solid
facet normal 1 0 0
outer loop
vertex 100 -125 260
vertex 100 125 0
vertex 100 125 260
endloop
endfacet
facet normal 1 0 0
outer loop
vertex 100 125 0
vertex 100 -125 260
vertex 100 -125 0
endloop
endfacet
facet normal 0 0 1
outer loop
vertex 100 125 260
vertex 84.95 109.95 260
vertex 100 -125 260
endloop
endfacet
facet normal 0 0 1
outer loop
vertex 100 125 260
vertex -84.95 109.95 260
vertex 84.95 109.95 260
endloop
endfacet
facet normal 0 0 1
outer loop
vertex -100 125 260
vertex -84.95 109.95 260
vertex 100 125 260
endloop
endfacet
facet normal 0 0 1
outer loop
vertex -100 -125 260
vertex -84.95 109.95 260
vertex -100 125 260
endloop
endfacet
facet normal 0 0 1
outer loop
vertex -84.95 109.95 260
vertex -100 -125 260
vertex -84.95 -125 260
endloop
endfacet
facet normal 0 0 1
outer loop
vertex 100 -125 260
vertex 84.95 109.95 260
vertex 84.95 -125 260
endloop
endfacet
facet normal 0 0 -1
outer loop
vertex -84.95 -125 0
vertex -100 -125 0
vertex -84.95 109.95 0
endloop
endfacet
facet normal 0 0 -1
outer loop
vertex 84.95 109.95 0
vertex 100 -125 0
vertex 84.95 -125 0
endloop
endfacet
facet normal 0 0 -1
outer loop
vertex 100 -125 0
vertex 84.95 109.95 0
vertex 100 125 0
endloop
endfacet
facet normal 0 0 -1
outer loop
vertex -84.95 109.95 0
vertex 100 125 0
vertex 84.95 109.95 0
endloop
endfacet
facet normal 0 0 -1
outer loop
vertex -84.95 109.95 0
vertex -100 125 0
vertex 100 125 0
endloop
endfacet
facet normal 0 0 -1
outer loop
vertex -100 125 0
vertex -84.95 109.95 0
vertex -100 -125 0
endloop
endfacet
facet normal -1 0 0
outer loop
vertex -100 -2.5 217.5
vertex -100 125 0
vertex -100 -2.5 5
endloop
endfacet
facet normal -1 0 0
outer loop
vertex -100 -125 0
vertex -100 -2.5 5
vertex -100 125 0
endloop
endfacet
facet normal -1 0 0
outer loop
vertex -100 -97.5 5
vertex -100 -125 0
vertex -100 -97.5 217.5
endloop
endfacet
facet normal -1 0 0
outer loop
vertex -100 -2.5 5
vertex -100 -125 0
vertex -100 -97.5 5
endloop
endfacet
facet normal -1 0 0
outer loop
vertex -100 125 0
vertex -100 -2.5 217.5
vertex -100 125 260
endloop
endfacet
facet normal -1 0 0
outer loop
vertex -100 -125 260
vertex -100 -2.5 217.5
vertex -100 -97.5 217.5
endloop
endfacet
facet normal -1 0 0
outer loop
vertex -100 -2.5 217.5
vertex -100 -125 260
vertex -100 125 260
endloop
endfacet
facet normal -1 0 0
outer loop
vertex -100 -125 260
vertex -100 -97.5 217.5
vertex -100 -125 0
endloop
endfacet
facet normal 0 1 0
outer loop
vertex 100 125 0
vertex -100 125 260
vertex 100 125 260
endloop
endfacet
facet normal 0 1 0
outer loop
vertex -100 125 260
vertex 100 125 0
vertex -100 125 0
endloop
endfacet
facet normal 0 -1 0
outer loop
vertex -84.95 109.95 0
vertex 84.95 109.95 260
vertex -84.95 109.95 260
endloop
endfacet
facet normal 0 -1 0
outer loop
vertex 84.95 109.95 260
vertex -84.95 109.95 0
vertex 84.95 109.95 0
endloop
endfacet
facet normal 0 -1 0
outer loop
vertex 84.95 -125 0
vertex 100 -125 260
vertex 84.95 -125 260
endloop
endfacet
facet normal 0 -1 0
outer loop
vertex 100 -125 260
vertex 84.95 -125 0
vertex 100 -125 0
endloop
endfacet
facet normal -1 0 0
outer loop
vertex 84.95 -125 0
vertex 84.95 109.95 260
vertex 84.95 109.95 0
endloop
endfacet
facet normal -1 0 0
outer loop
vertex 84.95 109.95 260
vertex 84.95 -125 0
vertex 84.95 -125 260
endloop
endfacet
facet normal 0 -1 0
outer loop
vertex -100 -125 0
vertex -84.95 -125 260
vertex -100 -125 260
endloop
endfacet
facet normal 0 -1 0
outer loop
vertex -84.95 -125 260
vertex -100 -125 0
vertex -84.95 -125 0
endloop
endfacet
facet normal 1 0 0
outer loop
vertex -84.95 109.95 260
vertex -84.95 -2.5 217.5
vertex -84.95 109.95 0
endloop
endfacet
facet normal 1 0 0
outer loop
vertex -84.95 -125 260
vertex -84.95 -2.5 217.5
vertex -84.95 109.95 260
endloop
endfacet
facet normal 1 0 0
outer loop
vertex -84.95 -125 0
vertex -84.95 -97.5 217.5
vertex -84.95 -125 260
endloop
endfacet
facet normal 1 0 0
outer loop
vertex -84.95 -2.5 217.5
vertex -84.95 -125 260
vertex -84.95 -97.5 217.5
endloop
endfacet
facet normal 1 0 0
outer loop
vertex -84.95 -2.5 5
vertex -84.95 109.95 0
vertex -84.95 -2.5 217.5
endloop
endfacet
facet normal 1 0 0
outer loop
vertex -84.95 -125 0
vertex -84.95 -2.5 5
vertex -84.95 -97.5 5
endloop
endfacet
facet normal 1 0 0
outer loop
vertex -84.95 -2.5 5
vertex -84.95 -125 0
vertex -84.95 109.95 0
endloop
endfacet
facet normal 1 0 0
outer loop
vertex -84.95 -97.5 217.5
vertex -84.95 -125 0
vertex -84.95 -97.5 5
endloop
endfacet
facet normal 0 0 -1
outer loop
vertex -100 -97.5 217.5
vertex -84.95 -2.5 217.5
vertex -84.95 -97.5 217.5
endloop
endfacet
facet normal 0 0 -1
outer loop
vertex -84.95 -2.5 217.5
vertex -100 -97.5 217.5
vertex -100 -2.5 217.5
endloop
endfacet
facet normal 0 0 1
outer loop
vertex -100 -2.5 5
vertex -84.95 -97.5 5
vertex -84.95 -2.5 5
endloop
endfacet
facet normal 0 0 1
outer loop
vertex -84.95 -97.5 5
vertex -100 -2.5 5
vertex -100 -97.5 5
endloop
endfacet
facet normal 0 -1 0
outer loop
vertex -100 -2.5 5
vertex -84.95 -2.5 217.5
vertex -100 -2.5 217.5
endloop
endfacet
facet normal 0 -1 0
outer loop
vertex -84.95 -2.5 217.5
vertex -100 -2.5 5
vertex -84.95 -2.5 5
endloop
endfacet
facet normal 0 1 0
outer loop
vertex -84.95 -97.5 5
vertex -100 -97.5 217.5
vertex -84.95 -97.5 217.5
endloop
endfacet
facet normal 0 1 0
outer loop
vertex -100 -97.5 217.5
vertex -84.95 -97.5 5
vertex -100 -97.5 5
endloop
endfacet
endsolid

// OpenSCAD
module kitchenwalls(width=250, length=200, wall_thickness=15, wall_height=260,wall_color=[255/255, 255/255, 255/255],wall_alpha=1.0, paint_the_room = [0.9, 0.3,0.9])
{
    // Door opening size. Then we need some extra space for the door frame.
    door_width = 90+5;
    door_height = 210+2.5;
    
    // Position the door so that bottom of opening is 5 cm above floor level
    door_y_pos = (wall_height-door_height)/2 - 5;
        
    // Position the door horizontally off the center.
    door_x_pos = -width/5;
    side_door_x_pos = -width/10;
    
    // Rise the part of floor which should stay dry by 2.5 cm.
    rise_floor = 2.5;
    rised_width = width/2;
    
    // Rise walk in floor more to allow sitting to toilet seat with dry feet by 2.0 cm for 100 cm
    double_rise_floor = 2.0;
    double_rised_length = 100;
    
    // Hole size, 8 cm
    hole_size = 8;

    /* difference() {
        union() {
            translate([0,-width/2+wall_thickness/2, wall_height/2]) 
            color(wall_color,wall_alpha) 
            cube([length, wall_thickness, wall_height],center=true);
            
            translate([0,-width/2+wall_thickness, wall_height/2]) 
            color(paint_the_room,wall_alpha) 
            cube([length, 0.1, wall_height],center=true);
        }
    
        // Door 
            color(wall_color,wall_alpha) 
            translate([side_door_x_pos,-width/2+wall_thickness/2, wall_height/2-door_y_pos]) cube([door_width, wall_thickness+1, door_height],center=true);
    } */

    difference() {
        union() {
            translate([0,width/2-wall_thickness/2, wall_height/2]) color(wall_color,wall_alpha) cube([length,  wall_thickness, wall_height],center=true);
            translate([0,width/2-wall_thickness, wall_height/2]) color(paint_the_room,wall_alpha) cube([length,  0.1, wall_height],center=true);
        }
    }
    
    difference() {
        union() {
            translate([length/2-wall_thickness/2, 0, wall_height/2]) color(wall_color,wall_alpha) cube([wall_thickness, width, wall_height],center=true);
            translate([length/2-wall_thickness, 0, wall_height/2]) color(paint_the_room,wall_alpha) cube([0.1, width, wall_height],center=true);
        }
    }     

    difference() {
        union() {
            translate([-length/2+wall_thickness/2, 0, wall_height/2]) color(wall_color,wall_alpha) cube([wall_thickness, width, wall_height],center=true);
            translate([-length/2+wall_thickness, 0, wall_height/2])  color(paint_the_room,wall_alpha) cube([0.1, width, wall_height],center=true);
        }

        // Door
        translate([-length/2+wall_thickness/2, door_x_pos, wall_height/2-door_y_pos])
            color(wall_color,wall_alpha)
            cube([wall_thickness+1, door_width, door_height],center=true);
    }
}

// For testing
kitchenwalls();
